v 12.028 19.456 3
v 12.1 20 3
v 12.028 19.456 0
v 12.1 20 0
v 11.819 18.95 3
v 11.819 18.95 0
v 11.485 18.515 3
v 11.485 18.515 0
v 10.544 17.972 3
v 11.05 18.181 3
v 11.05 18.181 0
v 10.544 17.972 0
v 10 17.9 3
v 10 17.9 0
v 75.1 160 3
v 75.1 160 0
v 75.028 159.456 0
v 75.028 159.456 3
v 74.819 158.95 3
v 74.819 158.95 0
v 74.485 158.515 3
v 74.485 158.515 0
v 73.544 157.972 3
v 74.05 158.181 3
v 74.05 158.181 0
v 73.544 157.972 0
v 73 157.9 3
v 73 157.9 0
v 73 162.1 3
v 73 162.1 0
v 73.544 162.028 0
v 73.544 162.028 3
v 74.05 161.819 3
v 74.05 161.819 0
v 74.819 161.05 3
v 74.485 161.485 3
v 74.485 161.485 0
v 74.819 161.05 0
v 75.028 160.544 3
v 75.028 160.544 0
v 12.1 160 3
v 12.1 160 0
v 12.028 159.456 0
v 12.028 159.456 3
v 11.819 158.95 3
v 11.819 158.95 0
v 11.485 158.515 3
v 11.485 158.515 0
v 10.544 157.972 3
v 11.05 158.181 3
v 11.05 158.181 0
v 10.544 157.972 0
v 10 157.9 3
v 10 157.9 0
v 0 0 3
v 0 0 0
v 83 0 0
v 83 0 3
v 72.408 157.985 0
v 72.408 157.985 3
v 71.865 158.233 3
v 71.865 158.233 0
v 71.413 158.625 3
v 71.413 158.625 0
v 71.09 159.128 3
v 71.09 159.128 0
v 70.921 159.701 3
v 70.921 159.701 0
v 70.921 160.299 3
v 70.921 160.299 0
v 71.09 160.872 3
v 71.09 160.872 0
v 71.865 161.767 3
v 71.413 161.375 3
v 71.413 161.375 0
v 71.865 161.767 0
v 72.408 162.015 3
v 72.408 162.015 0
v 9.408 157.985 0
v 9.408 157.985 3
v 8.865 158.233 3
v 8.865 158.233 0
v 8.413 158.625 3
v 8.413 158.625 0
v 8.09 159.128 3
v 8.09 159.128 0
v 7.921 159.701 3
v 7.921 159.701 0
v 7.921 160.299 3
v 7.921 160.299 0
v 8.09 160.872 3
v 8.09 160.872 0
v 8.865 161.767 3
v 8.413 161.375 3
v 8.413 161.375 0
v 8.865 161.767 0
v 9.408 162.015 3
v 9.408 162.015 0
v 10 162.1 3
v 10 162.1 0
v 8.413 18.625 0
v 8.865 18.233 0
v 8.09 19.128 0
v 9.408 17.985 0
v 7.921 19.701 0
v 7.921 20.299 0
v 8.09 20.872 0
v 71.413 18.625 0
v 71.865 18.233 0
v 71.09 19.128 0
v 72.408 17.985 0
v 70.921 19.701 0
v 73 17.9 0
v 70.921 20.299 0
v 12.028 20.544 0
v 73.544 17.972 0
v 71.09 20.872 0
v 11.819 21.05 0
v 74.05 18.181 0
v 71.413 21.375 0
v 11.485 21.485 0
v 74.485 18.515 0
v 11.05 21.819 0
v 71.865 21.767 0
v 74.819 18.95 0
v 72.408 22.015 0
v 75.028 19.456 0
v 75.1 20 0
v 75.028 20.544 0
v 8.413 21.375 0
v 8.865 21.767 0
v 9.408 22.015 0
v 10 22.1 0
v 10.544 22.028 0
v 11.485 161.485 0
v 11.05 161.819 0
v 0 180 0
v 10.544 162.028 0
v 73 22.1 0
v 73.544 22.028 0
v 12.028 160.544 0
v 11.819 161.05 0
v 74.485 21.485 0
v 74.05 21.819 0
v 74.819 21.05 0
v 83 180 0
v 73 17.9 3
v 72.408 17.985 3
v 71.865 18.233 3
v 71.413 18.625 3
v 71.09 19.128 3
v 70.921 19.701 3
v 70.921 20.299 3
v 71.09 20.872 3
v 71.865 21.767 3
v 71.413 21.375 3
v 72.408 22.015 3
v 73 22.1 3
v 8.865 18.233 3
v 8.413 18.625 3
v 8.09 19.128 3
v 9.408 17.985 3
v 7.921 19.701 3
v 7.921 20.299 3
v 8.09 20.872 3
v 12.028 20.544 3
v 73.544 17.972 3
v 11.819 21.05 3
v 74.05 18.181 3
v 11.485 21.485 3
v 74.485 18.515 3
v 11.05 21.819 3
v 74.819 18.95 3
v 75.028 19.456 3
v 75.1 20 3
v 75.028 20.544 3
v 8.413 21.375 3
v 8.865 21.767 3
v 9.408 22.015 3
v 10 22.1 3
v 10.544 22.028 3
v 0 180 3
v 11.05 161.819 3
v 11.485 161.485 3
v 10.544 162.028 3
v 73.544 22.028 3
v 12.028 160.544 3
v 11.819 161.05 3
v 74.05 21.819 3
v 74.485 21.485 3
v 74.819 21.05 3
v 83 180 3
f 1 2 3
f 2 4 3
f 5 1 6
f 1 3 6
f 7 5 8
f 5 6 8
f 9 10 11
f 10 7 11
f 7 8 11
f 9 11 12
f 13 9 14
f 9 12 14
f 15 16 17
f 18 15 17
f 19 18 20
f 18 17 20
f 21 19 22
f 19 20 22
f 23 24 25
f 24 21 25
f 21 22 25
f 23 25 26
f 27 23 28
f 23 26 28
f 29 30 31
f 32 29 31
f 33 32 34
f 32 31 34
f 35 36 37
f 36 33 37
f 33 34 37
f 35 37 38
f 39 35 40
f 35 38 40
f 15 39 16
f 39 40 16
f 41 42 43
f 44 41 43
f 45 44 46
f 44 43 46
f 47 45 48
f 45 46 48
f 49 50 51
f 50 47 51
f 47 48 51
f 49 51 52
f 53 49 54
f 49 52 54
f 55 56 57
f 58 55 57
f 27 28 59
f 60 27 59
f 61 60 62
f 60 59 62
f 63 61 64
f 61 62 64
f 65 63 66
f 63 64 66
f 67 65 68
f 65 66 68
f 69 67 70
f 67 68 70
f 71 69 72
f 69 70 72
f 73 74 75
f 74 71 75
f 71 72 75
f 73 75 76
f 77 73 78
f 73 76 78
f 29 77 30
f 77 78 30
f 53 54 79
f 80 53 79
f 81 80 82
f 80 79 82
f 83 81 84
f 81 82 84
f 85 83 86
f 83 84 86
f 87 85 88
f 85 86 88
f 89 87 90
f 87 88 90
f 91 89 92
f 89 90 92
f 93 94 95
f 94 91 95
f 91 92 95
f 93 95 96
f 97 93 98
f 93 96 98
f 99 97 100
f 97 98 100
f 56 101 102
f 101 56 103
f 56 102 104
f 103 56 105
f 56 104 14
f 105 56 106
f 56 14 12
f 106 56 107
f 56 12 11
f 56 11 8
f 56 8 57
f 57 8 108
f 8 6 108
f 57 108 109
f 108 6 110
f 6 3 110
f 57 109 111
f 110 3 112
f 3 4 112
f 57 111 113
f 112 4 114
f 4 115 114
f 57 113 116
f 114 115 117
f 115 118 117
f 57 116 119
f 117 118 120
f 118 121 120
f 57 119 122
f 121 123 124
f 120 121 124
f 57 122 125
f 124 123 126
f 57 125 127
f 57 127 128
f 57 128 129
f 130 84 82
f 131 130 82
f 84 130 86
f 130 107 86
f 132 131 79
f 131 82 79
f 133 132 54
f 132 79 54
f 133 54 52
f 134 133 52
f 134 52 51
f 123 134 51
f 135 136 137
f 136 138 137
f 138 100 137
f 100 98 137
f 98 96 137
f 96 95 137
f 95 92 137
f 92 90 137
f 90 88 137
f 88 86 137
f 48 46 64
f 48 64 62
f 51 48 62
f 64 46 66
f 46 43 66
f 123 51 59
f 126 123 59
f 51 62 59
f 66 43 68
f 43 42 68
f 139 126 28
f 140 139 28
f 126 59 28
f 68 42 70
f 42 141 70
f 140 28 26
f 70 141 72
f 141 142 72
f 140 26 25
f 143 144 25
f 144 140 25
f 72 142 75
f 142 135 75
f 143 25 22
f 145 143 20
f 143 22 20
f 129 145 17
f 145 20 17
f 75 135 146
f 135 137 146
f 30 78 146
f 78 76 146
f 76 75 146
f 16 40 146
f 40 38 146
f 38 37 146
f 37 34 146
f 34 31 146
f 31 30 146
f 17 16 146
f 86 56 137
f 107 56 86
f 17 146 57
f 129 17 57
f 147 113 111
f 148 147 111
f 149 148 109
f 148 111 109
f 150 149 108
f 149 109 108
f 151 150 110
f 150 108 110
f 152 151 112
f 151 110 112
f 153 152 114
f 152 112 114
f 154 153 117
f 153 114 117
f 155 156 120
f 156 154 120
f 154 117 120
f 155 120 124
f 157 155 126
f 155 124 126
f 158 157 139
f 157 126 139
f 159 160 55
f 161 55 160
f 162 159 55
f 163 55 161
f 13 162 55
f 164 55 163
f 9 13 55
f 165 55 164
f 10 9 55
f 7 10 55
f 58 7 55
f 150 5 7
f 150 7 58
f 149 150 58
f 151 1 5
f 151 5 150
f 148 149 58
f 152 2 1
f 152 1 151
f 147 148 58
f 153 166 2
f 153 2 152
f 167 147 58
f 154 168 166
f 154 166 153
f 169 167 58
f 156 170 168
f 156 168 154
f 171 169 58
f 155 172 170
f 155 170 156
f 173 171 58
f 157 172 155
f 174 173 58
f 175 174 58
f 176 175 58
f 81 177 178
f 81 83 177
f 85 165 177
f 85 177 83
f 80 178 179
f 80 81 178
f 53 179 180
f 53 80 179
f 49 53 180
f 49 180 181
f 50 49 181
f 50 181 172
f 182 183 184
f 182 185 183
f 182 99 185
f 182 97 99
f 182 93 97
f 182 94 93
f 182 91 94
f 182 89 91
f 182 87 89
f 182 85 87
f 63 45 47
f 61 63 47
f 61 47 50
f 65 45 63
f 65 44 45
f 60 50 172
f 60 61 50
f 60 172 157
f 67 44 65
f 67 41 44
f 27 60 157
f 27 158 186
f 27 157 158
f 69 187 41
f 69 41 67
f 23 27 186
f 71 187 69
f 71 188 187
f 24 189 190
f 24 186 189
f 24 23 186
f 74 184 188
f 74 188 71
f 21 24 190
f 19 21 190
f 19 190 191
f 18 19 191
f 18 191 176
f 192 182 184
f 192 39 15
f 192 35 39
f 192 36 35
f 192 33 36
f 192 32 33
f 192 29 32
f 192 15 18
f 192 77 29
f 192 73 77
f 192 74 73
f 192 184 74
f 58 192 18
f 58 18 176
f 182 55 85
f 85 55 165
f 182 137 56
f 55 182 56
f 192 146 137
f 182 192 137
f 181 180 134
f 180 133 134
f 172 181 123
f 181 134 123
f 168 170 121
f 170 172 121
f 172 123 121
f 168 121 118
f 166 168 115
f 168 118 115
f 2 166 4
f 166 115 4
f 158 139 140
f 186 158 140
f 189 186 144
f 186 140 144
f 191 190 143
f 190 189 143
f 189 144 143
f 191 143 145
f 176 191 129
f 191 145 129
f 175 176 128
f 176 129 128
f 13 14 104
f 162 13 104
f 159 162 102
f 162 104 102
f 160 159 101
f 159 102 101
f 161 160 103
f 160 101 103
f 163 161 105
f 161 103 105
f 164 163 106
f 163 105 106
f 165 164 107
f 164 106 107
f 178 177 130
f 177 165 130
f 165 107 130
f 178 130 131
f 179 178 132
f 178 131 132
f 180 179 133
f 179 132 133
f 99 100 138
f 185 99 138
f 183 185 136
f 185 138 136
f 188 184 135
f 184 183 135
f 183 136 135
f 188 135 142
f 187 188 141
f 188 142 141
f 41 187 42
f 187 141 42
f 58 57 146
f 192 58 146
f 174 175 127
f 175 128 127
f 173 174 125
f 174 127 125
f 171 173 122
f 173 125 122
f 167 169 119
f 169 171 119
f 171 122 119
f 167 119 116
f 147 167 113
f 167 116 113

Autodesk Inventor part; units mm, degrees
ref_plane "YZ Plane" through (0, 0, 0) normal (1, 0, 0) x (0, 1, 0)
ref_plane "XZ Plane" through (0, 0, 0) normal (0, 1, 0) x (-1, 0, 0)
ref_plane "XY Plane" through (0, 0, 0) normal (0, 0, 1) x (1, 0, 0)
sketch "Sketch1" plane through (0, 0, 0) normal (0, 0, 1) x (1, 0, 0)
  line L0 (83, 0) -> (83, 180)
  line L1 (83, 180) -> (0, 180)
  line L2 (0, 180) -> (0, 0)
  line L3 (0, 0) -> (83, 0)
  line L4 (10, 171.8151) -> (10, 9.9445)
  line L5 (73, 174.9264) -> (73, 13.0559)
  circle A0 centre (10, 160) radius 2.1
  circle A1 centre (73, 160) radius 2.1
  circle A2 centre (10, 20) radius 2.1
  circle A3 centre (73, 20) radius 2.1
  dimension "d0" = 83
  dimension "d1" = 180
  dimension "d8" = 4.2
  dimension "d9" = 4.2
  dimension "d10" = 4.2
  dimension "d11" = 4.2
  dimension "d12" = 10
  dimension "d13" = 10
  dimension "d14" = 20
  dimension "d15" = 20
  dimension "d16" = 20
  dimension "d17" = 20
extrude "Extrusion1" add sketch "Sketch1" along normal blind 3
equation "\"d9\" = d8"
equation "\"d10\" = d8"
equation "\"d11\" = d10"
properties part number "BaseC_2" material "PMMA Plastic"
